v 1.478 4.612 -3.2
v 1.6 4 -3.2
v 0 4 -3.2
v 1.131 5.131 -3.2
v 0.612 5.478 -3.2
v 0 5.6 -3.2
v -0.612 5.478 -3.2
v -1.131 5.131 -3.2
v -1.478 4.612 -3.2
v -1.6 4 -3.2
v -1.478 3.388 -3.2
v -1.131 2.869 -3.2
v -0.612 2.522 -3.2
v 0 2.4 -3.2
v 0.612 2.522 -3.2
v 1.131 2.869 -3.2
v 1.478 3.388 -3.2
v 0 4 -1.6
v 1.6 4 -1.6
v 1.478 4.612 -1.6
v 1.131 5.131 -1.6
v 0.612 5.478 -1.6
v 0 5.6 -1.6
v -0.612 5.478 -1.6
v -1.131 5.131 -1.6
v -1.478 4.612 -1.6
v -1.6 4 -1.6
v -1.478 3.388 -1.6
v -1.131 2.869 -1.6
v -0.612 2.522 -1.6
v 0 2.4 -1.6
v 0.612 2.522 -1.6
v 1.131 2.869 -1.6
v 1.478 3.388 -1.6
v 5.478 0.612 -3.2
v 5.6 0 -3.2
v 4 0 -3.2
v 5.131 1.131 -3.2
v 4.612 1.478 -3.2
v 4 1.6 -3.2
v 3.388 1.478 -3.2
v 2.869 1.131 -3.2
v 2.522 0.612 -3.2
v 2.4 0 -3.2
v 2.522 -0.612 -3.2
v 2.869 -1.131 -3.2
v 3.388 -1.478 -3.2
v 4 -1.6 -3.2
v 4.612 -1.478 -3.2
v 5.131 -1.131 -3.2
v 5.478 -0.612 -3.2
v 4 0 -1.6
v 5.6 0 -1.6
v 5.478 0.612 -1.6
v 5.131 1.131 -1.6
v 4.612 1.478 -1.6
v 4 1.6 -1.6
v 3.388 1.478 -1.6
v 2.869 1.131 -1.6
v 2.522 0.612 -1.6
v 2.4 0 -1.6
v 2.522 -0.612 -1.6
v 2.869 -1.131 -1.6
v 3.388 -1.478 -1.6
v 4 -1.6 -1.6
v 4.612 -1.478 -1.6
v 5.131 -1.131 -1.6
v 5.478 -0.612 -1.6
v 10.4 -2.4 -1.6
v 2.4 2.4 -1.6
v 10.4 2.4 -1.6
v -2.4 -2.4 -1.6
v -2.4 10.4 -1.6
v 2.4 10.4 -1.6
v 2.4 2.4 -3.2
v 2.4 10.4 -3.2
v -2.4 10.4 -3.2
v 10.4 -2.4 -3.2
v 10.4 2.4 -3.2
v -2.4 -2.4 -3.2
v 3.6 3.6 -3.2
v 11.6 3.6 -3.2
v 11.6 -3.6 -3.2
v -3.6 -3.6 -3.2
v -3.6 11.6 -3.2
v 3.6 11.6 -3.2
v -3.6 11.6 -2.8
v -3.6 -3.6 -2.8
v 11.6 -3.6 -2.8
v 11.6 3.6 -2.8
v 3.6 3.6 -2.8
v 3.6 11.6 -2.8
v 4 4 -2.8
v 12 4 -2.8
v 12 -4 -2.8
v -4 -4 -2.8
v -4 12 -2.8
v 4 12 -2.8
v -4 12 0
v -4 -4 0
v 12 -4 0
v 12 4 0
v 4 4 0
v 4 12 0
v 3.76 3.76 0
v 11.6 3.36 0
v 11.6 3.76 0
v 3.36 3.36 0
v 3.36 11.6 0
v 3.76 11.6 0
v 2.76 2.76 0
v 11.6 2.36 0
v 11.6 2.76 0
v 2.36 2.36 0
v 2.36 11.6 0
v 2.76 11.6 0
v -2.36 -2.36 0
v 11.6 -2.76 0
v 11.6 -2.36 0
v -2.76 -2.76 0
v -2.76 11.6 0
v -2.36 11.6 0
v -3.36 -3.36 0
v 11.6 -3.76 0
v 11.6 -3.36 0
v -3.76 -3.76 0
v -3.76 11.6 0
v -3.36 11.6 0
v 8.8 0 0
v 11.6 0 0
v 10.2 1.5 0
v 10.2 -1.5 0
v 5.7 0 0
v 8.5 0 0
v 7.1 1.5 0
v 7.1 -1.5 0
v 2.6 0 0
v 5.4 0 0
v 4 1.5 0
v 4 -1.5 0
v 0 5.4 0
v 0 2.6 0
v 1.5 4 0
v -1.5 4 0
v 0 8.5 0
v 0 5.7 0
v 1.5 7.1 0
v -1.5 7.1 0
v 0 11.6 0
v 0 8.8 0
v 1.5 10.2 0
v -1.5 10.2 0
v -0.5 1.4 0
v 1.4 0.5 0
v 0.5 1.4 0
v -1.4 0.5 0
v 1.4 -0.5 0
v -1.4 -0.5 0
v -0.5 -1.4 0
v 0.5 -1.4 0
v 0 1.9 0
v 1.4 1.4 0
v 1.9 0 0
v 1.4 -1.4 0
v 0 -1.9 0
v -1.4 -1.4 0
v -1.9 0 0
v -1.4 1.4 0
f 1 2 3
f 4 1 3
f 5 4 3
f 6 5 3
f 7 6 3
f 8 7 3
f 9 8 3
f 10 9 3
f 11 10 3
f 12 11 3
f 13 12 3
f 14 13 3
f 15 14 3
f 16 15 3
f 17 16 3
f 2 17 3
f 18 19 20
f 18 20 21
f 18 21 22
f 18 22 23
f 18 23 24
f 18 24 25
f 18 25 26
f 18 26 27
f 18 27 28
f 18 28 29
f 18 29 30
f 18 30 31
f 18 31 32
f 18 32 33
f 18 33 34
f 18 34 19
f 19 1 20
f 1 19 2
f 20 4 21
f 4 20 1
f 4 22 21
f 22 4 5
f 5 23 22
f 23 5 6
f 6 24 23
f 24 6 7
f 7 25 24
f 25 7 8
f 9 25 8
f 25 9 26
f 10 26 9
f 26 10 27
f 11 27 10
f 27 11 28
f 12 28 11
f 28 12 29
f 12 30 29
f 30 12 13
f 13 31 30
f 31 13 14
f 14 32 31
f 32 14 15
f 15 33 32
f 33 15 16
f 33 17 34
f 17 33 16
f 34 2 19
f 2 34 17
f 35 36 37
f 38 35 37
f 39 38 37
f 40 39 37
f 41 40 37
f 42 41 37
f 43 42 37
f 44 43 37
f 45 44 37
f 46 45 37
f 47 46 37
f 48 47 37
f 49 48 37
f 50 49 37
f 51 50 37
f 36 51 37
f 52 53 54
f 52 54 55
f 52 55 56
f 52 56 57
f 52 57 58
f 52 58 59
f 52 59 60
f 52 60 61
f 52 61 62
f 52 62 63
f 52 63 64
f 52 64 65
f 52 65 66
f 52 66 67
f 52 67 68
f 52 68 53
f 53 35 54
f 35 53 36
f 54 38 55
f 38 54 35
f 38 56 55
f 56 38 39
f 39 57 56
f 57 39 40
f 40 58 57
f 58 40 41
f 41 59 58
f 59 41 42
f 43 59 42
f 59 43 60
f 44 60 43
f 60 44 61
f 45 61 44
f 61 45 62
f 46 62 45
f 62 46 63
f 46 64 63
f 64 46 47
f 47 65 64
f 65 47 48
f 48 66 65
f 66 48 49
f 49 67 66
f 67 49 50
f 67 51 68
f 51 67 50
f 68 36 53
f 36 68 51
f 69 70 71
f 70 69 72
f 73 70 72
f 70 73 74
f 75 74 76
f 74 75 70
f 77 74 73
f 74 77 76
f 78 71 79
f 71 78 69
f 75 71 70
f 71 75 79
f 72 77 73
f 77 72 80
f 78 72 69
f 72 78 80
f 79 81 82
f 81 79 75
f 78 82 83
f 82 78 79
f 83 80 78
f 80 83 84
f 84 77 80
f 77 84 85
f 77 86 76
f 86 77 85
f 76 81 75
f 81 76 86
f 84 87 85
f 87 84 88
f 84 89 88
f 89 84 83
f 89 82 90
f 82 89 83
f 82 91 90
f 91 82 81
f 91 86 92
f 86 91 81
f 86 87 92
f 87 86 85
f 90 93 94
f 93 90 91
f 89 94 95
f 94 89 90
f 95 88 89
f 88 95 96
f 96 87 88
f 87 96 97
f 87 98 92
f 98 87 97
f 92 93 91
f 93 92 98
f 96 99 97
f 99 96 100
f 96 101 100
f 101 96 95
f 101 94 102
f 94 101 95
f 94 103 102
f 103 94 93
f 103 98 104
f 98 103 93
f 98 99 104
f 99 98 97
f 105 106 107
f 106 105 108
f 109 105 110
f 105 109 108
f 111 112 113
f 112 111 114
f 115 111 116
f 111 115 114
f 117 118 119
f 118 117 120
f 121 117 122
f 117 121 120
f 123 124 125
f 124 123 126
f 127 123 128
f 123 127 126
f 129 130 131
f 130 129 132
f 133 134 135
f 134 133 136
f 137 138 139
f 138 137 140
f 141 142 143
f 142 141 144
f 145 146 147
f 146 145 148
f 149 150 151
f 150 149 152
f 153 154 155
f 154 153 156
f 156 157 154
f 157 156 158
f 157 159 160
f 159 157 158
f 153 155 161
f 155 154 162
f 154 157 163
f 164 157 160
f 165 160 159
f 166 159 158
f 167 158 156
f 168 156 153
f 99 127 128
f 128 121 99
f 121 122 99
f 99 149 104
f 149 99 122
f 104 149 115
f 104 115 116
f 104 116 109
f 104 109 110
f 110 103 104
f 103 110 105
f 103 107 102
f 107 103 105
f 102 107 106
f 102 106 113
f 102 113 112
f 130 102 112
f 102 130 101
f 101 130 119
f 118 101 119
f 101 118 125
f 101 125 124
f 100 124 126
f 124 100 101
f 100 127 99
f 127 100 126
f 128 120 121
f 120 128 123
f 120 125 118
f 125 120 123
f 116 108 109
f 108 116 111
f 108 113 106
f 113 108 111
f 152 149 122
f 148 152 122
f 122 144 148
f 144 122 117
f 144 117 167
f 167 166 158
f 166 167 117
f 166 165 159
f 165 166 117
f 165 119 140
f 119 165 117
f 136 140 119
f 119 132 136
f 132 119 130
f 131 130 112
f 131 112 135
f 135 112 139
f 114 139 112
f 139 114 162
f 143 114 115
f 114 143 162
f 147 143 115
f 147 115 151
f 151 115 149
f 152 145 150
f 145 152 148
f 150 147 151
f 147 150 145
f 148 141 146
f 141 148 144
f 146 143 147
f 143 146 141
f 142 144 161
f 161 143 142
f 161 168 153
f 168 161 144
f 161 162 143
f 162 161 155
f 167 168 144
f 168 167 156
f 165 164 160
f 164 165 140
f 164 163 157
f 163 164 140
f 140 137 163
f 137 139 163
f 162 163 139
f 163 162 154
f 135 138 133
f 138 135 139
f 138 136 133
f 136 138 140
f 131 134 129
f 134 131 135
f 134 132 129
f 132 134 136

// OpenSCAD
// file: ../p/4-4edge.scad
use <../lib.scad>
function ldraw_lib__4_4edge() = [
// 0 Circle 1.0
// 0 Name: 4-4edge.dat
// 0 Author: James Jessiman
// 0 !LDRAW_ORG Primitive UPDATE 2017-01
// 0 !LICENSE Licensed under CC BY 2.0 and CC BY 4.0 : see CAreadme.txt
// 
// 0 BFC CERTIFY CCW
  [0,"BFC","CERTIFY"],
  [0,"BFC","CCW"],
// 
// 0 !HISTORY 1998-12-15 [PTadmin] Official Update 1998-10
// 0 !HISTORY 2005-12-28 [PTadmin] Official Update 2005-01
// 0 !HISTORY 2007-06-24 [PTadmin] Header formatted for Contributor Agreement
// 0 !HISTORY 2008-07-01 [PTadmin] Official Update 2008-01
// 0 !HISTORY 2017-01-15 [Steffen] BFCed
// 0 !HISTORY 2017-12-30 [PTadmin] Official Update 2017-01
// 
// 
// 2 24 1 0 0 0.9239 0 0.3827
  [2,24,1,0,0,0.9239,0,0.3827],
// 2 24 0.9239 0 0.3827 0.7071 0 0.7071
  [2,24,0.9239,0,0.3827,0.7071,0,0.7071],
// 2 24 0.7071 0 0.7071 0.3827 0 0.9239
  [2,24,0.7071,0,0.7071,0.3827,0,0.9239],
// 2 24 0.3827 0 0.9239 0 0 1
  [2,24,0.3827,0,0.9239,0,0,1],
// 2 24 0 0 1 -0.3827 0 0.9239
  [2,24,0,0,1,-0.3827,0,0.9239],
// 2 24 -0.3827 0 0.9239 -0.7071 0 0.7071
  [2,24,-0.3827,0,0.9239,-0.7071,0,0.7071],
// 2 24 -0.7071 0 0.7071 -0.9239 0 0.3827
  [2,24,-0.7071,0,0.7071,-0.9239,0,0.3827],
// 2 24 -0.9239 0 0.3827 -1 0 -0
  [2,24,-0.9239,0,0.3827,-1,0,-0],
// 2 24 -1 0 -0 -0.9239 0 -0.3827
  [2,24,-1,0,-0,-0.9239,0,-0.3827],
// 2 24 -0.9239 0 -0.3827 -0.7071 0 -0.7071
  [2,24,-0.9239,0,-0.3827,-0.7071,0,-0.7071],
// 2 24 -0.7071 0 -0.7071 -0.3827 0 -0.9239
  [2,24,-0.7071,0,-0.7071,-0.3827,0,-0.9239],
// 2 24 -0.3827 0 -0.9239 0 0 -1
  [2,24,-0.3827,0,-0.9239,0,0,-1],
// 2 24 0 0 -1 0.3827 0 -0.9239
  [2,24,0,0,-1,0.3827,0,-0.9239],
// 2 24 0.3827 0 -0.9239 0.7071 0 -0.7071
  [2,24,0.3827,0,-0.9239,0.7071,0,-0.7071],
// 2 24 0.7071 0 -0.7071 0.9239 0 -0.3827
  [2,24,0.7071,0,-0.7071,0.9239,0,-0.3827],
// 2 24 0.9239 0 -0.3827 1 0 0
  [2,24,0.9239,0,-0.3827,1,0,0],
];
module ldraw_lib__4_4edge(step=0, col=false, unit=2/5, alt=false, line=0.2, solid=!$preview)
    makepoly(ldraw_lib__4_4edge(), step=step, col=col, unit=unit, alt=alt, line=line, solid=solid);
ldraw_lib__4_4edge(line=0.2);
// file: ../p/4-4disc.scad
use <../lib.scad>
function ldraw_lib__4_4disc() = [
// 0 Disc 1.0
// 0 Name: 4-4disc.dat
// 0 Author: James Jessiman
// 0 !LDRAW_ORG Primitive UPDATE 2002-02
// 0 !LICENSE Licensed under CC BY 2.0 and CC BY 4.0 : see CAreadme.txt
// 
// 0 BFC CERTIFY CCW
  [0,"BFC","CERTIFY"],
  [0,"BFC","CCW"],
// 
// 0 !HISTORY 1998-12-15 [PTadmin] Official Update 1998-10
// 0 !HISTORY 2002-03-23 [sbliss] Added BFC statement
// 0 !HISTORY 2002-04-25 [PTadmin] Official Update 2002-02
// 0 !HISTORY 2007-06-24 [PTadmin] Header formatted for Contributor Agreement
// 0 !HISTORY 2008-07-01 [PTadmin] Official Update 2008-01
// 
// 
// 3 16 0 0 0 1 0 0 0.9239 0 0.3827
  [3,16,0,0,0,1,0,0,0.9239,0,0.3827],
// 3 16 0 0 0 0.9239 0 0.3827 0.7071 0 0.7071
  [3,16,0,0,0,0.9239,0,0.3827,0.7071,0,0.7071],
// 3 16 0 0 0 0.7071 0 0.7071 0.3827 0 0.9239
  [3,16,0,0,0,0.7071,0,0.7071,0.3827,0,0.9239],
// 3 16 0 0 0 0.3827 0 0.9239 0 0 1
  [3,16,0,0,0,0.3827,0,0.9239,0,0,1],
// 3 16 0 0 0 0 0 1 -0.3827 0 0.9239
  [3,16,0,0,0,0,0,1,-0.3827,0,0.9239],
// 3 16 0 0 0 -0.3827 0 0.9239 -0.7071 0 0.7071
  [3,16,0,0,0,-0.3827,0,0.9239,-0.7071,0,0.7071],
// 3 16 0 0 0 -0.7071 0 0.7071 -0.9239 0 0.3827
  [3,16,0,0,0,-0.7071,0,0.7071,-0.9239,0,0.3827],
// 3 16 0 0 0 -0.9239 0 0.3827 -1 0 -0
  [3,16,0,0,0,-0.9239,0,0.3827,-1,0,-0],
// 3 16 0 0 0 -1 0 -0 -0.9239 0 -0.3827
  [3,16,0,0,0,-1,0,-0,-0.9239,0,-0.3827],
// 3 16 0 0 0 -0.9239 0 -0.3827 -0.7071 0 -0.7071
  [3,16,0,0,0,-0.9239,0,-0.3827,-0.7071,0,-0.7071],
// 3 16 0 0 0 -0.7071 0 -0.7071 -0.3827 0 -0.9239
  [3,16,0,0,0,-0.7071,0,-0.7071,-0.3827,0,-0.9239],
// 3 16 0 0 0 -0.3827 0 -0.9239 0 0 -1
  [3,16,0,0,0,-0.3827,0,-0.9239,0,0,-1],
// 3 16 0 0 0 0 0 -1 0.3827 0 -0.9239
  [3,16,0,0,0,0,0,-1,0.3827,0,-0.9239],
// 3 16 0 0 0 0.3827 0 -0.9239 0.7071 0 -0.7071
  [3,16,0,0,0,0.3827,0,-0.9239,0.7071,0,-0.7071],
// 3 16 0 0 0 0.7071 0 -0.7071 0.9239 0 -0.3827
  [3,16,0,0,0,0.7071,0,-0.7071,0.9239,0,-0.3827],
// 3 16 0 0 0 0.9239 0 -0.3827 1 0 0
  [3,16,0,0,0,0.9239,0,-0.3827,1,0,0],
// 0
];
module ldraw_lib__4_4disc(step=0, col=false, unit=2/5, alt=false, line=0.2, solid=!$preview)
    makepoly(ldraw_lib__4_4disc(), step=step, col=col, unit=unit, alt=alt, line=line, solid=solid);
ldraw_lib__4_4disc(line=0.2);
// file: ../p/4-4cyli.scad
use <../lib.scad>
$fa=1; $fs=0.2;
function ldraw_lib__4_4cyli(realsolid=false) = [
// 0 Cylinder 1.0
// 0 Name: 4-4cyli.dat
// 0 Author: James Jessiman
// 0 !LDRAW_ORG Primitive UPDATE 2005-01
// 0 !LICENSE Licensed under CC BY 2.0 and CC BY 4.0 : see CAreadme.txt
// 
// 0 BFC CERTIFY CCW
  [0,"BFC","CERTIFY"],
  [0,"BFC","CCW"],
// 
// 0 !HISTORY 1998-12-15 [PTadmin] Official Update 1998-10
// 0 !HISTORY 2002-03-23 [sbliss] Added BFC statement; merged headers from files in distributions LDraw 0.27 and Complete.
// 0 !HISTORY 2002-04-25 [PTadmin] Official Update 2002-02
// 0 !HISTORY 2004-12-14 [guyvivan] BFC CCW
// 0 !HISTORY 2005-12-28 [PTadmin] Official Update 2005-01
// 0 !HISTORY 2007-06-24 [PTadmin] Header formatted for Contributor Agreement
// 0 !HISTORY 2008-07-01 [PTadmin] Official Update 2008-01
// 
// 
// 4 16 1 1 0 0.9239 1 0.3827 0.9239 0 0.3827 1 0 0
  [4,16,1,1,0,0.9239,1,0.3827,0.9239,0,0.3827,1,0,0],
// 5 24 1 0 0 1 1 0 0.9239 0 0.3827 0.9239 0 -0.3827
  [5,24,1,0,0,1,1,0,0.9239,0,0.3827,0.9239,0,-0.3827],
// 4 16 0.9239 1 0.3827 0.7071 1 0.7071 0.7071 0 0.7071 0.9239 0 0.3827
  [4,16,0.9239,1,0.3827,0.7071,1,0.7071,0.7071,0,0.7071,0.9239,0,0.3827],
// 5 24 0.9239 0 0.3827 0.9239 1 0.3827 0.7071 0 0.7071 1 0 0
  [5,24,0.9239,0,0.3827,0.9239,1,0.3827,0.7071,0,0.7071,1,0,0],
// 4 16 0.7071 1 0.7071 0.3827 1 0.9239 0.3827 0 0.9239 0.7071 0 0.7071
  [4,16,0.7071,1,0.7071,0.3827,1,0.9239,0.3827,0,0.9239,0.7071,0,0.7071],
// 5 24 0.7071 0 0.7071 0.7071 1 0.7071 0.3827 0 0.9239 0.9239 0 0.3827
  [5,24,0.7071,0,0.7071,0.7071,1,0.7071,0.3827,0,0.9239,0.9239,0,0.3827],
// 4 16 0.3827 1 0.9239 0 1 1 0 0 1 0.3827 0 0.9239
  [4,16,0.3827,1,0.9239,0,1,1,0,0,1,0.3827,0,0.9239],
// 5 24 0.3827 0 0.9239 0.3827 1 0.9239 0 0 1 0.7071 0 0.7071
  [5,24,0.3827,0,0.9239,0.3827,1,0.9239,0,0,1,0.7071,0,0.7071],
// 4 16 0 1 1 -0.3827 1 0.9239 -0.3827 0 0.9239 0 0 1
  [4,16,0,1,1,-0.3827,1,0.9239,-0.3827,0,0.9239,0,0,1],
// 5 24 0 0 1 0 1 1 -0.3827 0 0.9239 0.3827 0 0.9239
  [5,24,0,0,1,0,1,1,-0.3827,0,0.9239,0.3827,0,0.9239],
// 4 16 -0.3827 1 0.9239 -0.7071 1 0.7071 -0.7071 0 0.7071 -0.3827 0 0.9239
  [4,16,-0.3827,1,0.9239,-0.7071,1,0.7071,-0.7071,0,0.7071,-0.3827,0,0.9239],
// 5 24 -0.3827 0 0.9239 -0.3827 1 0.9239 -0.7071 0 0.7071 0 0 1
  [5,24,-0.3827,0,0.9239,-0.3827,1,0.9239,-0.7071,0,0.7071,0,0,1],
// 4 16 -0.7071 1 0.7071 -0.9239 1 0.3827 -0.9239 0 0.3827 -0.7071 0 0.7071
  [4,16,-0.7071,1,0.7071,-0.9239,1,0.3827,-0.9239,0,0.3827,-0.7071,0,0.7071],
// 5 24 -0.7071 0 0.7071 -0.7071 1 0.7071 -0.9239 0 0.3827 -0.3827 0 0.9239
  [5,24,-0.7071,0,0.7071,-0.7071,1,0.7071,-0.9239,0,0.3827,-0.3827,0,0.9239],
// 4 16 -0.9239 1 0.3827 -1 1 0 -1 0 0 -0.9239 0 0.3827
  [4,16,-0.9239,1,0.3827,-1,1,0,-1,0,0,-0.9239,0,0.3827],
// 5 24 -0.9239 0 0.3827 -0.9239 1 0.3827 -1 0 0 -0.7071 0 0.7071
  [5,24,-0.9239,0,0.3827,-0.9239,1,0.3827,-1,0,0,-0.7071,0,0.7071],
// 4 16 -1 1 0 -0.9239 1 -0.3827 -0.9239 0 -0.3827 -1 0 0
  [4,16,-1,1,0,-0.9239,1,-0.3827,-0.9239,0,-0.3827,-1,0,0],
// 5 24 -1 0 0 -1 1 0 -0.9239 0 -0.3827 -0.9239 0 0.3827
  [5,24,-1,0,0,-1,1,0,-0.9239,0,-0.3827,-0.9239,0,0.3827],
// 4 16 -0.9239 1 -0.3827 -0.7071 1 -0.7071 -0.7071 0 -0.7071 -0.9239 0 -0.3827
  [4,16,-0.9239,1,-0.3827,-0.7071,1,-0.7071,-0.7071,0,-0.7071,-0.9239,0,-0.3827],
// 5 24 -0.9239 0 -0.3827 -0.9239 1 -0.3827 -0.7071 0 -0.7071 -1 0 0
  [5,24,-0.9239,0,-0.3827,-0.9239,1,-0.3827,-0.7071,0,-0.7071,-1,0,0],
// 4 16 -0.7071 1 -0.7071 -0.3827 1 -0.9239 -0.3827 0 -0.9239 -0.7071 0 -0.7071
  [4,16,-0.7071,1,-0.7071,-0.3827,1,-0.9239,-0.3827,0,-0.9239,-0.7071,0,-0.7071],
// 5 24 -0.7071 0 -0.7071 -0.7071 1 -0.7071 -0.3827 0 -0.9239 -0.9239 0 -0.3827
  [5,24,-0.7071,0,-0.7071,-0.7071,1,-0.7071,-0.3827,0,-0.9239,-0.9239,0,-0.3827],
// 4 16 -0.3827 1 -0.9239 0 1 -1 0 0 -1 -0.3827 0 -0.9239
  [4,16,-0.3827,1,-0.9239,0,1,-1,0,0,-1,-0.3827,0,-0.9239],
// 5 24 -0.3827 0 -0.9239 -0.3827 1 -0.9239 0 0 -1 -0.7071 0 -0.7071
  [5,24,-0.3827,0,-0.9239,-0.3827,1,-0.9239,0,0,-1,-0.7071,0,-0.7071],
// 4 16 0 1 -1 0.3827 1 -0.9239 0.3827 0 -0.9239 0 0 -1
  [4,16,0,1,-1,0.3827,1,-0.9239,0.3827,0,-0.9239,0,0,-1],
// 5 24 0 0 -1 0 1 -1 0.3827 0 -0.9239 -0.3827 0 -0.9239
  [5,24,0,0,-1,0,1,-1,0.3827,0,-0.9239,-0.3827,0,-0.9239],
// 4 16 0.3827 1 -0.9239 0.7071 1 -0.7071 0.7071 0 -0.7071 0.3827 0 -0.9239
  [4,16,0.3827,1,-0.9239,0.7071,1,-0.7071,0.7071,0,-0.7071,0.3827,0,-0.9239],
// 5 24 0.3827 0 -0.9239 0.3827 1 -0.9239 0.7071 0 -0.7071 0 0 -1
  [5,24,0.3827,0,-0.9239,0.3827,1,-0.9239,0.7071,0,-0.7071,0,0,-1],
// 4 16 0.7071 1 -0.7071 0.9239 1 -0.3827 0.9239 0 -0.3827 0.7071 0 -0.7071
  [4,16,0.7071,1,-0.7071,0.9239,1,-0.3827,0.9239,0,-0.3827,0.7071,0,-0.7071],
// 5 24 0.7071 0 -0.7071 0.7071 1 -0.7071 0.9239 0 -0.3827 0.3827 0 -0.9239
  [5,24,0.7071,0,-0.7071,0.7071,1,-0.7071,0.9239,0,-0.3827,0.3827,0,-0.9239],
// 4 16 0.9239 1 -0.3827 1 1 0 1 0 0 0.9239 0 -0.3827
  [4,16,0.9239,1,-0.3827,1,1,0,1,0,0,0.9239,0,-0.3827],
// 5 24 0.9239 0 -0.3827 0.9239 1 -0.3827 1 0 0 0.7071 0 -0.7071
  [5,24,0.9239,0,-0.3827,0.9239,1,-0.3827,1,0,0,0.7071,0,-0.7071],
// 0
];
module ldraw_lib__4_4cyli(step=0, col=false, unit=2/5, alt=false, line=0.2, solid=!$preview)
    makepoly(ldraw_lib__4_4cyli(solid), step=step, col=col, unit=unit, alt=alt, line=line, solid=solid);
ldraw_lib__4_4cyli(line=0.2);
// file: ../p/stud3.scad
use <../lib.scad>
use <4-4cyli.scad>
use <4-4disc.scad>
use <4-4edge.scad>
function ldraw_lib__stud3() = [
// 0 Stud Tube Solid
// 0 Name: stud3.dat
// 0 Author: James Jessiman
// 0 !LDRAW_ORG Primitive UPDATE 2012-01
// 0 !LICENSE Licensed under CC BY 4.0 : see CAreadme.txt
// 
// 0 BFC CERTIFY CCW
  [0,"BFC","CERTIFY"],
  [0,"BFC","CCW"],
// 
// 0 !HISTORY 2002-04-04 [sbliss] Modified for BFC compliance
// 0 !HISTORY 2002-04-25 [PTadmin] Official Update 2002-02
// 0 !HISTORY 2007-06-24 [PTadmin] Header formatted for Contributor Agreement
// 0 !HISTORY 2008-07-01 [PTadmin] Official Update 2008-01
// 0 !HISTORY 2012-02-16 [Philo] Changed to CCW
// 0 !HISTORY 2012-03-30 [PTadmin] Official Update 2012-01
// 
// 
// 1 16 0 -4 0 4 0 0 0 1 0 0 0 4 4-4edge.dat
  [1,16,0,-4,0,4,0,0,0,1,0,0,0,4, ldraw_lib__4_4edge()],
// 1 16 0 0 0 4 0 0 0 1 0 0 0 4 4-4edge.dat
  [1,16,0,0,0,4,0,0,0,1,0,0,0,4, ldraw_lib__4_4edge()],
// 1 16 0 -4 0 4 0 0 0 1 0 0 0 4 4-4disc.dat
  [1,16,0,-4,0,4,0,0,0,1,0,0,0,4, ldraw_lib__4_4disc()],
  [-1,16,0,0,0,4,0,0,0,-1,0,0,0,4, ldraw_lib__4_4disc()],
// 1 16 0 -4 0 4 0 0 0 4 0 0 0 4 4-4cyli.dat
  [1,16,0,-4,0,4,0,0,0,4,0,0,0,4, ldraw_lib__4_4cyli()],
];
module ldraw_lib__stud3(step=0, col=false, unit=2/5, alt=false, line=0.2, solid=!$preview)
    makepoly(ldraw_lib__stud3(), step=step, col=col, unit=unit, alt=alt, line=line, solid=solid);
ldraw_lib__stud3(line=0.2);
// file: ../p/box2-7.scad
use <../lib.scad>
function ldraw_lib__box2_7() = [
// 0 Box with  2 Faces without  7 Edges
// 0 Name: box2-7.dat
// 0 Author: Willy Tschager [Holly-Wood]
// 0 !LDRAW_ORG Primitive UPDATE 2024-01
// 0 !LICENSE Licensed under CC BY 4.0 : see CAreadme.txt
// 
// 0 BFC CERTIFY CCW
  [0,"BFC","CERTIFY"],
  [0,"BFC","CCW"],
// 
// 0 !HISTORY 2009-05-02 [PTadmin] Official Update 2009-01
// 0 !HISTORY 2024-01-02 [Holly-Wood] Complete re-write, original by guyvivan
// 0 !HISTORY 2024-01-29 [OrionP] Official Update 2024-01
// 
// 2 24 -1 1 -1 -1 1 1
  [2,24,-1,1,-1,-1,1,1],
// 2 24 1 1 1 1 1 -1
  [2,24,1,1,1,1,1,-1],
// 4 16 -1 1 1 1 1 1 1 1 -1 -1 1 -1
  [4,16,-1,1,1,1,1,1,1,1,-1,-1,1,-1],
// 
// 2 24 -1 1 1 -1 -1 1
  [2,24,-1,1,1,-1,-1,1],
// 2 24 1 1 1 1 -1 1
  [2,24,1,1,1,1,-1,1],
// 4 16 1 -1 1 1 1 1 -1 1 1 -1 -1 1
  [4,16,1,-1,1,1,1,1,-1,1,1,-1,-1,1],
// 
// 2 24 -1 1 1 1 1 1
  [2,24,-1,1,1,1,1,1],
];
module ldraw_lib__box2_7(step=0, col=false, unit=2/5, alt=false, line=0.2, solid=!$preview)
    makepoly(ldraw_lib__box2_7(), step=step, col=col, unit=unit, alt=alt, line=line, solid=solid);
ldraw_lib__box2_7(line=0.2);
// file: ../p/box2-5.scad
use <../lib.scad>
$fa=1; $fs=0.2;
function ldraw_lib__box2_5(realsolid=false) = [
// 0 Box with 2 Faces without 5 Edges
// 0 Name: box2-5.dat
// 0 Author: Steffen [Steffen]
// 0 !LDRAW_ORG Primitive UPDATE 2003-03
// 0 !LICENSE Licensed under CC BY 2.0 and CC BY 4.0 : see CAreadme.txt
// 
// 0 BFC CERTIFY CCW
  [0,"BFC","CERTIFY"],
  [0,"BFC","CCW"],
// 
// 0 !HISTORY 2003-12-19 [PTadmin] Official Update 2003-03
// 0 !HISTORY 2007-06-24 [PTadmin] Header formatted for Contributor Agreement
// 0 !HISTORY 2008-07-01 [PTadmin] Official Update 2008-01
// 
// 
// 2 24 1 1 1 -1 1 1
  [2,24,1,1,1,-1,1,1],
// 2 24 1 1 -1 -1 1 -1
  [2,24,1,1,-1,-1,1,-1],
// 2 24 1 -1 1 -1 -1 1
  [2,24,1,-1,1,-1,-1,1],
// 2 24 -1 -1 1 -1 1 1
  [2,24,-1,-1,1,-1,1,1],
// 2 24 1 -1 1 1 1 1
  [2,24,1,-1,1,1,1,1],
// 2 24 -1 1 -1 -1 1 1
  [2,24,-1,1,-1,-1,1,1],
// 2 24 1 1 -1 1 1 1
  [2,24,1,1,-1,1,1,1],
// 4 16 1 1 1 1 1 -1 -1 1 -1 -1 1 1
  [4,16,1,1,1,1,1,-1,-1,1,-1,-1,1,1],
// 4 16 1 1 1 -1 1 1 -1 -1 1 1 -1 1
  [4,16,1,1,1,-1,1,1,-1,-1,1,1,-1,1],
// 0
];
module ldraw_lib__box2_5(step=0, col=false, unit=2/5, alt=false, line=0.2, solid=!$preview)
    makepoly(ldraw_lib__box2_5(solid), step=step, col=col, unit=unit, alt=alt, line=line, solid=solid);
ldraw_lib__box2_5(line=0.2);
// file: s/14719s01.scad
use <../../lib.scad>
use <../../p/box2-5.scad>
use <../../p/box2-7.scad>
use <../../p/stud3.scad>
function ldraw_lib__s__14719s01() = [
// 0 ~Tile  2 x  2 Corner without Top Face
// 0 Name: s\14719s01.dat
// 0 Author: Max Martin Richter [MMR1988]
// 0 !LDRAW_ORG Subpart UPDATE 2015-02
// 0 !LICENSE Licensed under CC BY 4.0 : see CAreadme.txt
// 
// 0 BFC CERTIFY CCW
  [0,"BFC","CERTIFY"],
  [0,"BFC","CCW"],
// 
// 0 !HISTORY 2015-12-30 [PTadmin] Official Update 2015-02
// 
// 
// 1 16 0 4 10 1 0 0 0 -1 0 0 0 1 stud3.dat
  [1,16,0,4,10,1,0,0,0,-1,0,0,0,1, ldraw_lib__stud3()],
// 1 16 10 4 0 1 0 0 0 -1 0 0 0 1 stud3.dat
  [1,16,10,4,0,1,0,0,0,-1,0,0,0,1, ldraw_lib__stud3()],
// 
// 4 16 26 4 -6 -6 4 -6 6 4 6 26 4 6
  [4,16,26,4,-6,-6,4,-6,6,4,6,26,4,6],
// 4 16 6 4 26 6 4 6 -6 4 -6 -6 4 26
  [4,16,6,4,26,6,4,6,-6,4,-6,-6,4,26],
// 
// 0 BFC INVERTNEXT
  [0,"BFC","INVERTNEXT"],
// 1 16 0 6 16 0 6 0 2 0 0 0 0 10 box2-7.dat
  [1,16,0,6,16,0,6,0,2,0,0,0,0,10, ldraw_lib__box2_7()],
// 0 BFC INVERTNEXT
  [0,"BFC","INVERTNEXT"],
// 1 16 16 6 0 0 10 0 2 0 0 0 0 6 box2-7.dat
  [1,16,16,6,0,0,10,0,2,0,0,0,0,6, ldraw_lib__box2_7()],
// 0 BFC INVERTNEXT
  [0,"BFC","INVERTNEXT"],
// 1 16 10 6 10 0 -16 0 2 0 0 0 0 -16 box2-5.dat
  [1,16,10,6,10,0,-16,0,2,0,0,0,0,-16, ldraw_lib__box2_5()],
// 2 24 6 8 6 6 4 6
  [2,24,6,8,6,6,4,6],
// 
// 4 16 29 8 9 26 8 6 6 8 6 9 8 9
  [4,16,29,8,9,26,8,6,6,8,6,9,8,9],
// 4 16 29 8 -9 26 8 -6 26 8 6 29 8 9
  [4,16,29,8,-9,26,8,-6,26,8,6,29,8,9],
// 4 16 -9 8 -9 -6 8 -6 26 8 -6 29 8 -9
  [4,16,-9,8,-9,-6,8,-6,26,8,-6,29,8,-9],
// 4 16 -9 8 29 -6 8 26 -6 8 -6 -9 8 -9
  [4,16,-9,8,29,-6,8,26,-6,8,-6,-9,8,-9],
// 4 16 9 8 29 6 8 26 -6 8 26 -9 8 29
  [4,16,9,8,29,6,8,26,-6,8,26,-9,8,29],
// 4 16 9 8 9 6 8 6 6 8 26 9 8 29
  [4,16,9,8,9,6,8,6,6,8,26,9,8,29],
// 
// 1 16 10 7.5 10 0 -19 0 0.5 0 0 0 0 -19 box2-5.dat
  [1,16,10,7.5,10,0,-19,0,0.5,0,0,0,0,-19, ldraw_lib__box2_5()],
// 1 16 19 7.5 0 0 10 0 0.5 0 0 0 0 9 box2-7.dat
  [1,16,19,7.5,0,0,10,0,0.5,0,0,0,0,9, ldraw_lib__box2_7()],
// 1 16 0 7.5 19 0 9 0 0.5 0 0 0 0 10 box2-7.dat
  [1,16,0,7.5,19,0,9,0,0.5,0,0,0,0,10, ldraw_lib__box2_7()],
// 2 24 9 8 9 9 7 9
  [2,24,9,8,9,9,7,9],
// 
// 4 16 9 7 9 10 7 10 30 7 10 29 7 9
  [4,16,9,7,9,10,7,10,30,7,10,29,7,9],
// 4 16 29 7 9 30 7 10 30 7 -10 29 7 -9
  [4,16,29,7,9,30,7,10,30,7,-10,29,7,-9],
// 4 16 29 7 -9 30 7 -10 -10 7 -10 -9 7 -9
  [4,16,29,7,-9,30,7,-10,-10,7,-10,-9,7,-9],
// 4 16 -9 7 -9 -10 7 -10 -10 7 30 -9 7 29
  [4,16,-9,7,-9,-10,7,-10,-10,7,30,-9,7,29],
// 4 16 -9 7 29 -10 7 30 10 7 30 9 7 29
  [4,16,-9,7,29,-10,7,30,10,7,30,9,7,29],
// 4 16 9 7 29 10 7 30 10 7 10 9 7 9
  [4,16,9,7,29,10,7,30,10,7,10,9,7,9],
// 
// 1 16 10 3.5 10 0 -20 0 3.5 0 0 0 0 -20 box2-5.dat
  [1,16,10,3.5,10,0,-20,0,3.5,0,0,0,0,-20, ldraw_lib__box2_5()],
// 1 16 20 3.5 0 0 10 0 3.5 0 0 0 0 10 box2-7.dat
  [1,16,20,3.5,0,0,10,0,3.5,0,0,0,0,10, ldraw_lib__box2_7()],
// 1 16 0 3.5 20 0 10 0 3.5 0 0 0 0 10 box2-7.dat
  [1,16,0,3.5,20,0,10,0,3.5,0,0,0,0,10, ldraw_lib__box2_7()],
// 2 24 10 7 10 10 0 10
  [2,24,10,7,10,10,0,10],
];
module ldraw_lib__s__14719s01(step=0, col=false, unit=2/5, alt=false, line=0.2, solid=!$preview)
    makepoly(ldraw_lib__s__14719s01(), step=step, col=col, unit=unit, alt=alt, line=line, solid=solid);
ldraw_lib__s__14719s01(line=0.2);
// main file
use <../lib.scad>
use <s/14719s01.scad>
function ldraw_lib__14719p00() = [
// 0 Tile  2 x  2 Corner with Orange and Yellow Diamonds, Blue Star and Dark Turquoise Lines Pattern
// 0 Name: 14719p00.dat
// 0 Author: Vincent Messenet [Cheenzo]
// 0 !LDRAW_ORG Part UPDATE 2025-01
// 0 !LICENSE Licensed under CC BY 4.0 : see CAreadme.txt
// 
// 0 BFC CERTIFY CCW
  [0,"BFC","CERTIFY"],
  [0,"BFC","CCW"],
// 
// 0 !KEYWORDS Bricklink  14719pb010, Rebrickable 14719pr0002, Set 10359
// 
// 0 !HISTORY 2025-01-20 [OrionP] Official Update 2025-01
// 
// 1 16 0 0 0 1 0 0 0 1 0 0 0 1 s\14719s01.dat
  [1,16,0,0,0,1,0,0,0,1,0,0,0,1, ldraw_lib__s__14719s01()],
// 
// 4 3 29 0 8.4 29 0 9.4 9.4 0 9.4 8.4 0 8.4
  [4,3,29,0,8.4,29,0,9.4,9.4,0,9.4,8.4,0,8.4],
// 4 3 8.4 0 8.4 9.4 0 9.4 9.4 0 29 8.4 0 29
  [4,3,8.4,0,8.4,9.4,0,9.4,9.4,0,29,8.4,0,29],
// 4 3 5.9 0 5.9 29 0 5.9 29 0 6.9 6.9 0 6.9
  [4,3,5.9,0,5.9,29,0,5.9,29,0,6.9,6.9,0,6.9],
// 4 3 5.9 0 5.9 6.9 0 6.9 6.9 0 29 5.9 0 29
  [4,3,5.9,0,5.9,6.9,0,6.9,6.9,0,29,5.9,0,29],
// 4 3 29 0 -6.9 29 0 -5.9 -5.9 0 -5.9 -6.9 0 -6.9
  [4,3,29,0,-6.9,29,0,-5.9,-5.9,0,-5.9,-6.9,0,-6.9],
// 4 3 -6.9 0 -6.9 -5.9 0 -5.9 -5.9 0 29 -6.9 0 29
  [4,3,-6.9,0,-6.9,-5.9,0,-5.9,-5.9,0,29,-6.9,0,29],
// 4 3 -9.4 0 -9.4 29 0 -9.4 29 0 -8.4 -8.4 0 -8.4
  [4,3,-9.4,0,-9.4,29,0,-9.4,29,0,-8.4,-8.4,0,-8.4],
// 4 3 -9.4 0 -9.4 -8.4 0 -8.4 -8.4 0 29 -9.4 0 29
  [4,3,-9.4,0,-9.4,-8.4,0,-8.4,-8.4,0,29,-9.4,0,29],
// 4 14 29 0 0 25.5 0 3.75 22 0 0 25.5 0 -3.75
  [4,14,29,0,0,25.5,0,3.75,22,0,0,25.5,0,-3.75],
// 4 25 21.25 0 0 17.75 0 3.75 14.25 0 0 17.75 0 -3.75
  [4,25,21.25,0,0,17.75,0,3.75,14.25,0,0,17.75,0,-3.75],
// 4 14 13.5 0 0 10 0 3.75 6.5 0 0 10 0 -3.75
  [4,14,13.5,0,0,10,0,3.75,6.5,0,0,10,0,-3.75],
// 4 25 0 0 13.5 -3.75 0 10 0 0 6.5 3.75 0 10
  [4,25,0,0,13.5,-3.75,0,10,0,0,6.5,3.75,0,10],
// 4 14 0 0 21.25 -3.75 0 17.75 0 0 14.25 3.75 0 17.75
  [4,14,0,0,21.25,-3.75,0,17.75,0,0,14.25,3.75,0,17.75],
// 4 25 0 0 29 -3.75 0 25.5 0 0 22 3.75 0 25.5
  [4,25,0,0,29,-3.75,0,25.5,0,0,22,3.75,0,25.5],
// 4 1 3.5 0 1.25 1.25 0 3.5 -1.25 0 3.5 -3.5 0 1.25
  [4,1,3.5,0,1.25,1.25,0,3.5,-1.25,0,3.5,-3.5,0,1.25],
// 4 1 3.5 0 -1.25 3.5 0 1.25 -3.5 0 1.25 -3.5 0 -1.25
  [4,1,3.5,0,-1.25,3.5,0,1.25,-3.5,0,1.25,-3.5,0,-1.25],
// 4 1 1.25 0 -3.5 3.5 0 -1.25 -3.5 0 -1.25 -1.25 0 -3.5
  [4,1,1.25,0,-3.5,3.5,0,-1.25,-3.5,0,-1.25,-1.25,0,-3.5],
// 3 1 -1.25 0 3.5 1.25 0 3.5 0 0 4.75
  [3,1,-1.25,0,3.5,1.25,0,3.5,0,0,4.75],
// 3 1 1.25 0 3.5 3.5 0 1.25 3.5 0 3.5
  [3,1,1.25,0,3.5,3.5,0,1.25,3.5,0,3.5],
// 3 1 3.5 0 1.25 3.5 0 -1.25 4.75 0 0
  [3,1,3.5,0,1.25,3.5,0,-1.25,4.75,0,0],
// 3 1 3.5 0 -3.5 3.5 0 -1.25 1.25 0 -3.5
  [3,1,3.5,0,-3.5,3.5,0,-1.25,1.25,0,-3.5],
// 3 1 0 0 -4.75 1.25 0 -3.5 -1.25 0 -3.5
  [3,1,0,0,-4.75,1.25,0,-3.5,-1.25,0,-3.5],
// 3 1 -3.5 0 -3.5 -1.25 0 -3.5 -3.5 0 -1.25
  [3,1,-3.5,0,-3.5,-1.25,0,-3.5,-3.5,0,-1.25],
// 3 1 -4.75 0 0 -3.5 0 -1.25 -3.5 0 1.25
  [3,1,-4.75,0,0,-3.5,0,-1.25,-3.5,0,1.25],
// 3 1 -3.5 0 3.5 -3.5 0 1.25 -1.25 0 3.5
  [3,1,-3.5,0,3.5,-3.5,0,1.25,-1.25,0,3.5],
// 3 16 -10 0 30 -9.4 0 29 -8.4 0 29
  [3,16,-10,0,30,-9.4,0,29,-8.4,0,29],
// 3 16 -8.4 0 29 -6.9 0 29 -10 0 30
  [3,16,-8.4,0,29,-6.9,0,29,-10,0,30],
// 3 16 -6.9 0 29 -5.9 0 29 -10 0 30
  [3,16,-6.9,0,29,-5.9,0,29,-10,0,30],
// 4 16 10 0 30 -10 0 30 -5.9 0 29 0 0 29
  [4,16,10,0,30,-10,0,30,-5.9,0,29,0,0,29],
// 3 16 10 0 30 0 0 29 5.9 0 29
  [3,16,10,0,30,0,0,29,5.9,0,29],
// 3 16 10 0 30 5.9 0 29 6.9 0 29
  [3,16,10,0,30,5.9,0,29,6.9,0,29],
// 3 16 10 0 30 6.9 0 29 8.4 0 29
  [3,16,10,0,30,6.9,0,29,8.4,0,29],
// 3 16 10 0 30 8.4 0 29 9.4 0 29
  [3,16,10,0,30,8.4,0,29,9.4,0,29],
// 4 16 10 0 30 9.4 0 29 9.4 0 9.4 10 0 10
  [4,16,10,0,30,9.4,0,29,9.4,0,9.4,10,0,10],
// 4 16 30 0 10 10 0 10 9.4 0 9.4 29 0 9.4
  [4,16,30,0,10,10,0,10,9.4,0,9.4,29,0,9.4],
// 3 16 30 0 10 29 0 9.4 29 0 8.4
  [3,16,30,0,10,29,0,9.4,29,0,8.4],
// 3 16 30 0 10 29 0 8.4 29 0 6.9
  [3,16,30,0,10,29,0,8.4,29,0,6.9],
// 3 16 30 0 10 29 0 6.9 29 0 5.9
  [3,16,30,0,10,29,0,6.9,29,0,5.9],
// 4 16 30 0 -10 30 0 10 29 0 5.9 29 0 0
  [4,16,30,0,-10,30,0,10,29,0,5.9,29,0,0],
// 3 16 30 0 -10 29 0 0 29 0 -5.9
  [3,16,30,0,-10,29,0,0,29,0,-5.9],
// 3 16 29 0 -6.9 30 0 -10 29 0 -5.9
  [3,16,29,0,-6.9,30,0,-10,29,0,-5.9],
// 3 16 30 0 -10 29 0 -6.9 29 0 -8.4
  [3,16,30,0,-10,29,0,-6.9,29,0,-8.4],
// 3 16 30 0 -10 29 0 -8.4 29 0 -9.4
  [3,16,30,0,-10,29,0,-8.4,29,0,-9.4],
// 4 16 -10 0 -10 30 0 -10 29 0 -9.4 -9.4 0 -9.4
  [4,16,-10,0,-10,30,0,-10,29,0,-9.4,-9.4,0,-9.4],
// 4 16 -9.4 0 -9.4 -9.4 0 29 -10 0 30 -10 0 -10
  [4,16,-9.4,0,-9.4,-9.4,0,29,-10,0,30,-10,0,-10],
// 4 16 -6.9 0 29 -8.4 0 29 -8.4 0 -8.4 -6.9 0 -6.9
  [4,16,-6.9,0,29,-8.4,0,29,-8.4,0,-8.4,-6.9,0,-6.9],
// 4 16 -6.9 0 -6.9 -8.4 0 -8.4 29 0 -8.4 29 0 -6.9
  [4,16,-6.9,0,-6.9,-8.4,0,-8.4,29,0,-8.4,29,0,-6.9],
// 4 16 8.4 0 8.4 8.4 0 29 6.9 0 29 6.9 0 6.9
  [4,16,8.4,0,8.4,8.4,0,29,6.9,0,29,6.9,0,6.9],
// 4 16 29 0 8.4 8.4 0 8.4 6.9 0 6.9 29 0 6.9
  [4,16,29,0,8.4,8.4,0,8.4,6.9,0,6.9,29,0,6.9],
// 3 16 -3.75 0 25.5 0 0 29 -5.9 0 29
  [3,16,-3.75,0,25.5,0,0,29,-5.9,0,29],
// 3 16 -3.75 0 17.75 -3.75 0 25.5 -5.9 0 29
  [3,16,-3.75,0,17.75,-3.75,0,25.5,-5.9,0,29],
// 4 16 -3.75 0 17.75 -5.9 0 29 -5.9 0 -5.9 -3.75 0 10
  [4,16,-3.75,0,17.75,-5.9,0,29,-5.9,0,-5.9,-3.75,0,10],
// 3 16 -3.75 0 10 -5.9 0 -5.9 -4.75 0 0
  [3,16,-3.75,0,10,-5.9,0,-5.9,-4.75,0,0],
// 4 16 -3.5 0 -3.5 -3.5 0 -1.25 -4.75 0 0 -5.9 0 -5.9
  [4,16,-3.5,0,-3.5,-3.5,0,-1.25,-4.75,0,0,-5.9,0,-5.9],
// 4 16 0 0 -4.75 -1.25 0 -3.5 -3.5 0 -3.5 -5.9 0 -5.9
  [4,16,0,0,-4.75,-1.25,0,-3.5,-3.5,0,-3.5,-5.9,0,-5.9],
// 4 16 29 0 -5.9 10 0 -3.75 0 0 -4.75 -5.9 0 -5.9
  [4,16,29,0,-5.9,10,0,-3.75,0,0,-4.75,-5.9,0,-5.9],
// 3 16 17.75 0 -3.75 10 0 -3.75 29 0 -5.9
  [3,16,17.75,0,-3.75,10,0,-3.75,29,0,-5.9],
// 3 16 29 0 -5.9 25.5 0 -3.75 17.75 0 -3.75
  [3,16,29,0,-5.9,25.5,0,-3.75,17.75,0,-3.75],
// 3 16 25.5 0 -3.75 29 0 -5.9 29 0 0
  [3,16,25.5,0,-3.75,29,0,-5.9,29,0,0],
// 3 16 25.5 0 3.75 29 0 0 29 0 5.9
  [3,16,25.5,0,3.75,29,0,0,29,0,5.9],
// 3 16 25.5 0 3.75 29 0 5.9 17.75 0 3.75
  [3,16,25.5,0,3.75,29,0,5.9,17.75,0,3.75],
// 3 16 17.75 0 3.75 29 0 5.9 10 0 3.75
  [3,16,17.75,0,3.75,29,0,5.9,10,0,3.75],
// 4 16 3.5 0 3.5 10 0 3.75 29 0 5.9 5.9 0 5.9
  [4,16,3.5,0,3.5,10,0,3.75,29,0,5.9,5.9,0,5.9],
// 4 16 3.75 0 10 3.5 0 3.5 5.9 0 5.9 5.9 0 29
  [4,16,3.75,0,10,3.5,0,3.5,5.9,0,5.9,5.9,0,29],
// 3 16 3.75 0 17.75 3.75 0 10 5.9 0 29
  [3,16,3.75,0,17.75,3.75,0,10,5.9,0,29],
// 3 16 3.75 0 17.75 5.9 0 29 3.75 0 25.5
  [3,16,3.75,0,17.75,5.9,0,29,3.75,0,25.5],
// 3 16 3.75 0 25.5 5.9 0 29 0 0 29
  [3,16,3.75,0,25.5,5.9,0,29,0,0,29],
// 4 16 0 0 22 -3.75 0 25.5 -3.75 0 17.75 0 0 21.25
  [4,16,0,0,22,-3.75,0,25.5,-3.75,0,17.75,0,0,21.25],
// 4 16 3.75 0 25.5 0 0 22 0 0 21.25 3.75 0 17.75
  [4,16,3.75,0,25.5,0,0,22,0,0,21.25,3.75,0,17.75],
// 4 16 -3.75 0 10 0 0 13.5 0 0 14.25 -3.75 0 17.75
  [4,16,-3.75,0,10,0,0,13.5,0,0,14.25,-3.75,0,17.75],
// 4 16 3.75 0 17.75 0 0 14.25 0 0 13.5 3.75 0 10
  [4,16,3.75,0,17.75,0,0,14.25,0,0,13.5,3.75,0,10],
// 3 16 0 0 6.5 -3.75 0 10 0 0 4.75
  [3,16,0,0,6.5,-3.75,0,10,0,0,4.75],
// 3 16 0 0 4.75 3.75 0 10 0 0 6.5
  [3,16,0,0,4.75,3.75,0,10,0,0,6.5],
// 4 16 -1.25 0 3.5 0 0 4.75 -3.75 0 10 -3.5 0 3.5
  [4,16,-1.25,0,3.5,0,0,4.75,-3.75,0,10,-3.5,0,3.5],
// 4 16 0 0 4.75 1.25 0 3.5 3.5 0 3.5 3.75 0 10
  [4,16,0,0,4.75,1.25,0,3.5,3.5,0,3.5,3.75,0,10],
// 4 16 -3.5 0 1.25 -3.5 0 3.5 -3.75 0 10 -4.75 0 0
  [4,16,-3.5,0,1.25,-3.5,0,3.5,-3.75,0,10,-4.75,0,0],
// 4 16 10 0 -3.75 3.5 0 -3.5 1.25 0 -3.5 0 0 -4.75
  [4,16,10,0,-3.75,3.5,0,-3.5,1.25,0,-3.5,0,0,-4.75],
// 4 16 4.75 0 0 3.5 0 -1.25 3.5 0 -3.5 10 0 -3.75
  [4,16,4.75,0,0,3.5,0,-1.25,3.5,0,-3.5,10,0,-3.75],
// 3 16 10 0 -3.75 6.5 0 0 4.75 0 0
  [3,16,10,0,-3.75,6.5,0,0,4.75,0,0],
// 3 16 6.5 0 0 10 0 3.75 4.75 0 0
  [3,16,6.5,0,0,10,0,3.75,4.75,0,0],
// 4 16 3.5 0 3.5 3.5 0 1.25 4.75 0 0 10 0 3.75
  [4,16,3.5,0,3.5,3.5,0,1.25,4.75,0,0,10,0,3.75],
// 4 16 13.5 0 0 14.25 0 0 17.75 0 3.75 10 0 3.75
  [4,16,13.5,0,0,14.25,0,0,17.75,0,3.75,10,0,3.75],
// 4 16 14.25 0 0 13.5 0 0 10 0 -3.75 17.75 0 -3.75
  [4,16,14.25,0,0,13.5,0,0,10,0,-3.75,17.75,0,-3.75],
// 4 16 21.25 0 0 22 0 0 25.5 0 3.75 17.75 0 3.75
  [4,16,21.25,0,0,22,0,0,25.5,0,3.75,17.75,0,3.75],
// 4 16 25.5 0 -3.75 22 0 0 21.25 0 0 17.75 0 -3.75
  [4,16,25.5,0,-3.75,22,0,0,21.25,0,0,17.75,0,-3.75],
];
module ldraw_lib__14719p00(step=0, col=false, unit=2/5, alt=false, line=0.2, solid=!$preview)
    makepoly(ldraw_lib__14719p00(), step=step, col=col, unit=unit, alt=alt, line=line, solid=solid);
ldraw_lib__14719p00(line=0.2);
